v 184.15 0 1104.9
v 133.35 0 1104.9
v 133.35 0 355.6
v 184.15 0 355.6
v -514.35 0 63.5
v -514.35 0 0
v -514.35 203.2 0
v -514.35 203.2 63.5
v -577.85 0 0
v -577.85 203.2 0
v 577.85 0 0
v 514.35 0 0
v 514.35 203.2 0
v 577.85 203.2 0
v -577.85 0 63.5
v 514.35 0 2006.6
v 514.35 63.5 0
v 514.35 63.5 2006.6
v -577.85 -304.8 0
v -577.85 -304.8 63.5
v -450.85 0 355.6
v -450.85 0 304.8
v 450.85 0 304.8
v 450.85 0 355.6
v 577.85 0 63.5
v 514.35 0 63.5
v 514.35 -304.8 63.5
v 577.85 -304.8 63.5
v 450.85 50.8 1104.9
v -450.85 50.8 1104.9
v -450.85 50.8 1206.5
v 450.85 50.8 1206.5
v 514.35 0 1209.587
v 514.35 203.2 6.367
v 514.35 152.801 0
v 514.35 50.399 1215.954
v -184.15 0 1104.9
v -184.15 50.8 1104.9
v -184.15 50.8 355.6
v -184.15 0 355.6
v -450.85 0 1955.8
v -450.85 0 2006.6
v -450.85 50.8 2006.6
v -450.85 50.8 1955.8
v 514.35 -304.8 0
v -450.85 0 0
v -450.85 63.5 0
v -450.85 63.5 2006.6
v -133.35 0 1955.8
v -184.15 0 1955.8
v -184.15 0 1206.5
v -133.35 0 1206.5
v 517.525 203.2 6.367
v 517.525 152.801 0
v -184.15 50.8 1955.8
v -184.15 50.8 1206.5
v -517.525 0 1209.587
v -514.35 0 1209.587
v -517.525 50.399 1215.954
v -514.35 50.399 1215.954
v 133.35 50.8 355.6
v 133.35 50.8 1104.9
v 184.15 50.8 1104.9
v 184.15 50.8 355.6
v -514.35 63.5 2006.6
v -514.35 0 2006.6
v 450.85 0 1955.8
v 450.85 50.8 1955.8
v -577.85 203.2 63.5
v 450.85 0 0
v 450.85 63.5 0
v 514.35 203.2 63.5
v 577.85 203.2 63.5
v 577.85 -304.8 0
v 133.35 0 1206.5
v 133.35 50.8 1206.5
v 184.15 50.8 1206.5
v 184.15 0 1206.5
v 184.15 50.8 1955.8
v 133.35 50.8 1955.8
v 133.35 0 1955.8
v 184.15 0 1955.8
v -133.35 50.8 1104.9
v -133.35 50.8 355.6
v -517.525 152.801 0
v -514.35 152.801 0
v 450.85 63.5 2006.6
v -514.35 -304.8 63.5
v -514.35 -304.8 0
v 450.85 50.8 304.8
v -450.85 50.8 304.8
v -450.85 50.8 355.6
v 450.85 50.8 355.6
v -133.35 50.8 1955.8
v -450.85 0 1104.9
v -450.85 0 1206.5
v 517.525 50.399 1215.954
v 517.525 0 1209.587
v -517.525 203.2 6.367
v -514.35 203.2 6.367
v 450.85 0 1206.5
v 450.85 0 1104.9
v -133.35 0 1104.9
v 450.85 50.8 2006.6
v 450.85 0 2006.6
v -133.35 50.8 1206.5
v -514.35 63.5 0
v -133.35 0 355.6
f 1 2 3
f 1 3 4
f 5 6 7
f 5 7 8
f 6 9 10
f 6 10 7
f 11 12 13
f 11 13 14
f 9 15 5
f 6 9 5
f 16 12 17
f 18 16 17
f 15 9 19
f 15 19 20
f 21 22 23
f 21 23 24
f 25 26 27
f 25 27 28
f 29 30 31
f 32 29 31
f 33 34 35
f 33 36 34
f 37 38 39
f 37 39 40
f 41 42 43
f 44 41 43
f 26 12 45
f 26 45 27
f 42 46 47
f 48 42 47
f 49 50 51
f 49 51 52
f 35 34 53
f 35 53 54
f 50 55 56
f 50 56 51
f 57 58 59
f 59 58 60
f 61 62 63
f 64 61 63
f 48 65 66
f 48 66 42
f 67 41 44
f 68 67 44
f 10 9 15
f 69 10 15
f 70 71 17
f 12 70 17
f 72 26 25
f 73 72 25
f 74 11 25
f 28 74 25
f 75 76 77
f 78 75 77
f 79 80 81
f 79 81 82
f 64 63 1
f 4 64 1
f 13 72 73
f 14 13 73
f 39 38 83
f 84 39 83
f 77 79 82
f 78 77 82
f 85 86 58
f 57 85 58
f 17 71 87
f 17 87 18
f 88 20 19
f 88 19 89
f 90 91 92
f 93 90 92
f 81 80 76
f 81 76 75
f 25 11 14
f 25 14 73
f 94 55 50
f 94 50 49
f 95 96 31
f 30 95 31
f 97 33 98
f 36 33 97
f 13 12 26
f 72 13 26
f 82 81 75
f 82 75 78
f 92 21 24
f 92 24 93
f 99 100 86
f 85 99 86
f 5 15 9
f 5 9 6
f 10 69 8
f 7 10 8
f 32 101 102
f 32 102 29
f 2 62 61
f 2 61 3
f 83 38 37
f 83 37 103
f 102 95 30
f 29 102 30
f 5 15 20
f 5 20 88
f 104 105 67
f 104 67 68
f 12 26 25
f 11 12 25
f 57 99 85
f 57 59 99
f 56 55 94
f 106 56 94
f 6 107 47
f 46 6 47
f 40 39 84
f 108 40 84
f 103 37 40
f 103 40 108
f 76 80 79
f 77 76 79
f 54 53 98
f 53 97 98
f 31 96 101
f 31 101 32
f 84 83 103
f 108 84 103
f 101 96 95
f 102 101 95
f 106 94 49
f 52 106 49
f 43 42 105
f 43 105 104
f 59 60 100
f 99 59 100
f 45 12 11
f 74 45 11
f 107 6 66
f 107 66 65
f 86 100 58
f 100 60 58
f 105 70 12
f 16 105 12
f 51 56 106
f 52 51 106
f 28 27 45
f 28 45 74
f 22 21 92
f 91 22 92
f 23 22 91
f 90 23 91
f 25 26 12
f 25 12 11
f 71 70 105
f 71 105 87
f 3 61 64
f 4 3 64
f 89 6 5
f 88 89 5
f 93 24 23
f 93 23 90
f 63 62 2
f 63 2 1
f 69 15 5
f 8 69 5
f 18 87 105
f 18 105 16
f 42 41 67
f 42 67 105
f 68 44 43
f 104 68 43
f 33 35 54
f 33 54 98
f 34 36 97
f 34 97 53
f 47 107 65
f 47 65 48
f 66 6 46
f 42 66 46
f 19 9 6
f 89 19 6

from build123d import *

# Parameters (mm, degrees)
F0_W      = 63.5
F0_H      = 63.5
F1_DEPTH  = 2006.6
F2_W      = 63.5
F2_H      = 63.5
F3_DEPTH  = 304.8
F4_DEPTH  = 203.2
F5_W      = 50.8
F5_H      = 50.8
F6_DEPTH  = 901.7
F7_W      = 50.8
F7_H      = 50.8
F8_DEPTH  = 749.3
F9_W      = 50.8
F9_H      = 50.8
F10_DEPTH = 749.3
F12_DEPTH = 3.175


# Not quite as in the source:
# - a length typed as a fraction of an inch, garbled in the dataset ("3 / 203.2 mm" for 3/8 in), is restored


with BuildPart() as f1:
    # F0 (on Top) → F1 (new body)
    with BuildSketch(Plane.XY):
        with Locations((-482.6, 31.75)):
            Rectangle(F0_W, F0_H)
    extrude(amount=F1_DEPTH)


with BuildPart() as f1b:
    # F0 (on Top) → F1, piece 2 (new body)
    with BuildSketch(Plane.XY):
        with Locations((482.6, 31.75)):
            Rectangle(F0_W, F0_H)
    extrude(amount=F1_DEPTH)


with BuildPart() as f3:
    # F2 (on Front) → F3 (new body)
    with BuildSketch(Plane.XZ):
        with Locations((-546.1, 31.75)):
            Rectangle(F2_W, F2_H)
    extrude(amount=F3_DEPTH)


with BuildPart() as f3b:
    # F2 (on Front) → F3, piece 2 (new body)
    with BuildSketch(Plane.XZ):
        with Locations((546.1, 31.75)):
            Rectangle(F2_W, F2_H)
    extrude(amount=F3_DEPTH)


with BuildPart() as f4:
    # F4 (new): a face of the model
    f4_faces = [f3.part.faces().sort_by_distance(p)[0] for p in [
        (-546.1, 0, 31.75),
    ]]
    extrude(f4_faces, amount=F4_DEPTH)


with BuildPart() as f4b:
    # F4#2 (new): a face of the model
    f4_2_faces = [f3b.part.faces().sort_by_distance(p)[0] for p in [
        (546.1, 0, 31.75),
    ]]
    extrude(f4_2_faces, amount=F4_DEPTH)


with BuildPart() as f6:
    # F5 (on face) → F6 (new body, through all)
    with BuildSketch(Plane.YZ.offset(-450.85)):
        with Locations((25.4, 1981.2)):
            Rectangle(F5_W, F5_H)
    extrude(amount=F6_DEPTH)


with BuildPart() as f6b:
    # F5 (on face) → F6, piece 2 (new body, through all)
    with BuildSketch(Plane.YZ.offset(-450.85)):
        with Locations((25.4, 1181.1)):
            Rectangle(F5_W, F5_H)
        with Locations((25.4, 1130.3)):
            Rectangle(F5_W, F5_H)
    extrude(amount=F6_DEPTH)


with BuildPart() as f6c:
    # F5 (on face) → F6, piece 3 (new body, through all)
    with BuildSketch(Plane.YZ.offset(-450.85)):
        with Locations((25.4, 330.2)):
            Rectangle(F5_W, F5_H)
    extrude(amount=F6_DEPTH)


with BuildPart() as f8:
    # F7 (on face) → F8 (new body, through all)
    with BuildSketch(Plane(origin=(0, 0, 1955.8), x_dir=(1, 0, 0), z_dir=(0, 0, -1))):
        with Locations((-158.75, -25.4)):
            Rectangle(F7_W, F7_H)
    extrude(amount=F8_DEPTH)


with BuildPart() as f8b:
    # F7 (on face) → F8, piece 2 (new body, through all)
    with BuildSketch(Plane(origin=(0, 0, 1955.8), x_dir=(1, 0, 0), z_dir=(0, 0, -1))):
        with Locations((158.75, -25.4)):
            Rectangle(F7_W, F7_H)
    extrude(amount=F8_DEPTH)


with BuildPart() as f10:
    # F9 (on face) → F10 (new body, through all)
    with BuildSketch(Plane(origin=(0, 0, 1104.9), x_dir=(1, 0, 0), z_dir=(0, 0, -1))):
        with Locations((158.75, -25.4)):
            Rectangle(F9_W, F9_H)
    extrude(amount=F10_DEPTH)


with BuildPart() as f10b:
    # F9 (on face) → F10, piece 2 (new body, through all)
    with BuildSketch(Plane(origin=(0, 0, 1104.9), x_dir=(1, 0, 0), z_dir=(0, 0, -1))):
        with Locations((-158.75, -25.4)):
            Rectangle(F9_W, F9_H)
    extrude(amount=F10_DEPTH)


with BuildPart() as f12:
    # F11 (on face) → F12 (new body)
    with BuildSketch(Plane(origin=(-514.35, 0, 0), x_dir=(0, -1, 0), z_dir=(-1, 0, 0))):
        Polygon((-63.5, 706.913542014), (-63.5, 1112.2482272862), (-203.2, 6.366689291), (-152.8005429844, 0), align=None)
        Polygon((0, 1209.5869683754), (-50.3994570156, 1215.9536576665), (-63.5, 1112.2482272862), (-63.5, 706.913542014), align=None)
    extrude(amount=F12_DEPTH)


with BuildPart() as f13_1:
    # F13: instance of F12
    add(f12.part.mirror(Plane.YZ))


solid = Compound([f1.part, f1b.part, f3.part, f3b.part, f4.part, f4b.part, f6.part, f6b.part, f6c.part, f8.part, f8b.part, f10.part, f10b.part, f12.part, f13_1.part])
